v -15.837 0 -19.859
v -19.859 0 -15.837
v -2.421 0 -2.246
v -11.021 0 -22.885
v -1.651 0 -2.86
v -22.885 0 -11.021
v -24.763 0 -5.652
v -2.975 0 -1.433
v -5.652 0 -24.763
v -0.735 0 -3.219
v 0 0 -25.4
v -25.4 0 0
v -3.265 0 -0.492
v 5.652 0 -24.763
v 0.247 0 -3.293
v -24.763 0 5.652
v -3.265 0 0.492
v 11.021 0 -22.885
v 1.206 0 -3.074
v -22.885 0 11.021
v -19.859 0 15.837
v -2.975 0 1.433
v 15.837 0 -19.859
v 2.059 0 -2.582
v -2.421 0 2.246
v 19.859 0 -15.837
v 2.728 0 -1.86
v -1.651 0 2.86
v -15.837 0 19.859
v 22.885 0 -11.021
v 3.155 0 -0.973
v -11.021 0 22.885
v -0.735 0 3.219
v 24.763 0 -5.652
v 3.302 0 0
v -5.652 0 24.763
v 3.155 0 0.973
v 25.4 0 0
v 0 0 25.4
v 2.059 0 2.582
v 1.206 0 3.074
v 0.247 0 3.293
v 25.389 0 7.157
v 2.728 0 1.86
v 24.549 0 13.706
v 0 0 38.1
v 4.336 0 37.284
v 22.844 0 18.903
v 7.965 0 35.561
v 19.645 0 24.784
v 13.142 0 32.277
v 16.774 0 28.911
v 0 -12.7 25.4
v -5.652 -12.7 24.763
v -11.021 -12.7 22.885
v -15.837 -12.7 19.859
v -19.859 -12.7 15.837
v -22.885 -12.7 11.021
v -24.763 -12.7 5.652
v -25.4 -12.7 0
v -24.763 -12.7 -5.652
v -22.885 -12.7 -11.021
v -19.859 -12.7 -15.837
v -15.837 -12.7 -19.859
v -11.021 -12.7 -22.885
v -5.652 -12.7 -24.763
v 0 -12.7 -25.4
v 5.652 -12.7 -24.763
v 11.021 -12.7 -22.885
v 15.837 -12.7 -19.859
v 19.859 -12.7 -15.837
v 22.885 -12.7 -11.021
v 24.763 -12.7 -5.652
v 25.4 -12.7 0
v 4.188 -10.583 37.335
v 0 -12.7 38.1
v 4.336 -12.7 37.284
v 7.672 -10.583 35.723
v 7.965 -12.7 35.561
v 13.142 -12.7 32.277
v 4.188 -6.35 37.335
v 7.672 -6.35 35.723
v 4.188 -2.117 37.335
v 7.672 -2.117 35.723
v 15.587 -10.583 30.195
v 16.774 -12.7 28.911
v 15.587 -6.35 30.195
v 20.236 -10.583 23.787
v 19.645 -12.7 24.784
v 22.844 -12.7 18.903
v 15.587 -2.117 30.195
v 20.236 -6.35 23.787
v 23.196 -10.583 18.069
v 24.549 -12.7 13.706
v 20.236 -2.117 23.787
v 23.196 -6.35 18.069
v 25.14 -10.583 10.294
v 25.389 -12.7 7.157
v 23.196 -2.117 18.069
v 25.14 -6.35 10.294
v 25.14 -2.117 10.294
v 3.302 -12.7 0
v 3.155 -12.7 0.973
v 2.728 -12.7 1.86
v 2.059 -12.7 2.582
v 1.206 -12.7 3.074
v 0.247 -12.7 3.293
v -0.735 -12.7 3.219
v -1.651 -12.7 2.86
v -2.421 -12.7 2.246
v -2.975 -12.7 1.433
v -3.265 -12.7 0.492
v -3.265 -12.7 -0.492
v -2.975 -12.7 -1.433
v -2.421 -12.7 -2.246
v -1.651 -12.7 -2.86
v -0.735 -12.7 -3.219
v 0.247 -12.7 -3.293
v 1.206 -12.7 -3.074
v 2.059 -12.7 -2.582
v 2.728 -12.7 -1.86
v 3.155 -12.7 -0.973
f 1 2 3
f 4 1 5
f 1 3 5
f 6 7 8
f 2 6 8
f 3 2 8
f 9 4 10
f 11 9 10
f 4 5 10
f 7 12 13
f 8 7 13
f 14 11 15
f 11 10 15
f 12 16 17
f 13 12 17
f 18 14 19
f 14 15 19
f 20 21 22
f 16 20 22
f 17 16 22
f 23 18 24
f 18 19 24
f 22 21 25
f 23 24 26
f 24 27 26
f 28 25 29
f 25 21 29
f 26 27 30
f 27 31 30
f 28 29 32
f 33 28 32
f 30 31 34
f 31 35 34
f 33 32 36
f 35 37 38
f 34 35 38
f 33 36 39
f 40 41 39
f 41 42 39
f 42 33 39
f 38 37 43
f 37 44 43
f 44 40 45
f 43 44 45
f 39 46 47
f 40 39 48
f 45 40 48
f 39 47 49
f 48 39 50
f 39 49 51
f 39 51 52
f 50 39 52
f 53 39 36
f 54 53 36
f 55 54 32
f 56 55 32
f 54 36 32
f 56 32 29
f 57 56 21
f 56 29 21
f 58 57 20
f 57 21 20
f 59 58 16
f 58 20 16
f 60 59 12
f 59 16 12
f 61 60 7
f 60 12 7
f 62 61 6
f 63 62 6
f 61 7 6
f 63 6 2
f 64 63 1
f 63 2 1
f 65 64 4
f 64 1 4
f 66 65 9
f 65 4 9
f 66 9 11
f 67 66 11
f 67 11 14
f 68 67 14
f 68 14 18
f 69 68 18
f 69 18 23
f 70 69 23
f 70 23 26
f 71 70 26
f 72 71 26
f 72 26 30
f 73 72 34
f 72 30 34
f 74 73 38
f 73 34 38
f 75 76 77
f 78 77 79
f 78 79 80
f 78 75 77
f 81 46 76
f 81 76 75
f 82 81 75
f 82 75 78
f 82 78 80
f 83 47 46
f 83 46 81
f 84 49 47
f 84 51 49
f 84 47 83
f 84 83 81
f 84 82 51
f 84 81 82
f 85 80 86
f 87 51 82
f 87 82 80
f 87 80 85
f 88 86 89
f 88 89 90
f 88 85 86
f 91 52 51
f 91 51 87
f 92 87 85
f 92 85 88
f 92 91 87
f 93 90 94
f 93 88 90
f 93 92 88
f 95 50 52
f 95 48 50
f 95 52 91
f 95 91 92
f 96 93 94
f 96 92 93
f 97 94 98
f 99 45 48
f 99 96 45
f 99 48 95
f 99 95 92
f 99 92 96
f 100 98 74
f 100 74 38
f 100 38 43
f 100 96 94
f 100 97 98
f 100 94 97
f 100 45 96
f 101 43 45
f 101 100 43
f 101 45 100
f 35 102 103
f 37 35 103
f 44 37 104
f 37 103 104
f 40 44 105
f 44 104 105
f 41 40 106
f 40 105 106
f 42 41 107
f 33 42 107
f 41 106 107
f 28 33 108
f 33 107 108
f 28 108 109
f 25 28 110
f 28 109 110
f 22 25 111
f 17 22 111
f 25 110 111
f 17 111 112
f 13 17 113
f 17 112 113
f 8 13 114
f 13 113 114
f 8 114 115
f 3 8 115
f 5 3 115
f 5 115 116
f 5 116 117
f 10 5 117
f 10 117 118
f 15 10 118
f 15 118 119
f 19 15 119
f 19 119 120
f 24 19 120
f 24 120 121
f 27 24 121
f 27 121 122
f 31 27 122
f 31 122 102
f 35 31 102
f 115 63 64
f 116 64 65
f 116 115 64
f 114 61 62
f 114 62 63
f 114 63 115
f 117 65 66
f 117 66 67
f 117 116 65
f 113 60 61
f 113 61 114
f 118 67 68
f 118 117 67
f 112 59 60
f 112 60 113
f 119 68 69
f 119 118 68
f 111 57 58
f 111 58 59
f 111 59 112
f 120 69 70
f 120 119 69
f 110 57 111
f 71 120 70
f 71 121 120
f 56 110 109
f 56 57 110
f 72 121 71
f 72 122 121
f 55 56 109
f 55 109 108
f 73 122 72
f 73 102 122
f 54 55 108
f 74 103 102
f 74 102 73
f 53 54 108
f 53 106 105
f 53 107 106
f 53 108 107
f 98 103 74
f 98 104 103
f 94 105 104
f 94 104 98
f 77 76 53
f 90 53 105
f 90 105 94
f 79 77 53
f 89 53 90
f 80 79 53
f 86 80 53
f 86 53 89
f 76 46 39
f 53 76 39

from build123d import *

# Parameters (mm, degrees)
F1_DEPTH = 12.7
F2_DEPTH = 12.7
F3_R     = 3.302
F4_DEPTH = 41.148


with BuildPart() as f1:
    # F0 (on Front) → F1 (new body)
    with BuildSketch(Plane.XZ):
        with BuildLine():
            ThreePointArc((0, 25.4), (-17.9605122421, -17.9605122421), (25.4, 0))
            ThreePointArc((25.4, 0), (17.9605122421, 17.9605122421), (0, 25.4))
        make_face()
    extrude(amount=F1_DEPTH)

    # F0 (on Front) → F2 (join)
    with BuildSketch(Plane.XZ):
        with BuildLine():
            ThreePointArc((0, 25.4), (-17.9605122421, -17.9605122421), (25.4, 0))
            ThreePointArc((25.4, 0), (17.9605122421, 17.9605122421), (0, 25.4))
        make_face()
        with BuildLine():
            ThreePointArc((0, 25.4), (17.9605122421, 17.9605122421), (25.4, 0))
            add(Edge.make_bspline(
                [(0, 38.1), (3.311857111, 37.9321821298), (7.478521166, 36.0197451091), (16.1118794602, 30.7079338501), (20.2292628288, 23.8370974126), (23.5047968087, 18.1542039797), (25.5735181803, 10.1314153802), (25.4731588994, 3.6121298538), (25.4, 0)],
                knots=[0, 0, 0, 0, 0.1635145653, 0.3427853453, 0.5051166288, 0.6515186212, 0.8148600106, 1, 1, 1, 1], degree=3))
            Line((0, 38.1), (0, 25.4))
        make_face()
    extrude(amount=F2_DEPTH)

    # F3 (on face) → F4 (cut)
    with BuildSketch(Plane.XZ.offset(12.7)):
        Circle(F3_R)
    extrude(amount=-F4_DEPTH, mode=Mode.SUBTRACT)


solid = f1.part
